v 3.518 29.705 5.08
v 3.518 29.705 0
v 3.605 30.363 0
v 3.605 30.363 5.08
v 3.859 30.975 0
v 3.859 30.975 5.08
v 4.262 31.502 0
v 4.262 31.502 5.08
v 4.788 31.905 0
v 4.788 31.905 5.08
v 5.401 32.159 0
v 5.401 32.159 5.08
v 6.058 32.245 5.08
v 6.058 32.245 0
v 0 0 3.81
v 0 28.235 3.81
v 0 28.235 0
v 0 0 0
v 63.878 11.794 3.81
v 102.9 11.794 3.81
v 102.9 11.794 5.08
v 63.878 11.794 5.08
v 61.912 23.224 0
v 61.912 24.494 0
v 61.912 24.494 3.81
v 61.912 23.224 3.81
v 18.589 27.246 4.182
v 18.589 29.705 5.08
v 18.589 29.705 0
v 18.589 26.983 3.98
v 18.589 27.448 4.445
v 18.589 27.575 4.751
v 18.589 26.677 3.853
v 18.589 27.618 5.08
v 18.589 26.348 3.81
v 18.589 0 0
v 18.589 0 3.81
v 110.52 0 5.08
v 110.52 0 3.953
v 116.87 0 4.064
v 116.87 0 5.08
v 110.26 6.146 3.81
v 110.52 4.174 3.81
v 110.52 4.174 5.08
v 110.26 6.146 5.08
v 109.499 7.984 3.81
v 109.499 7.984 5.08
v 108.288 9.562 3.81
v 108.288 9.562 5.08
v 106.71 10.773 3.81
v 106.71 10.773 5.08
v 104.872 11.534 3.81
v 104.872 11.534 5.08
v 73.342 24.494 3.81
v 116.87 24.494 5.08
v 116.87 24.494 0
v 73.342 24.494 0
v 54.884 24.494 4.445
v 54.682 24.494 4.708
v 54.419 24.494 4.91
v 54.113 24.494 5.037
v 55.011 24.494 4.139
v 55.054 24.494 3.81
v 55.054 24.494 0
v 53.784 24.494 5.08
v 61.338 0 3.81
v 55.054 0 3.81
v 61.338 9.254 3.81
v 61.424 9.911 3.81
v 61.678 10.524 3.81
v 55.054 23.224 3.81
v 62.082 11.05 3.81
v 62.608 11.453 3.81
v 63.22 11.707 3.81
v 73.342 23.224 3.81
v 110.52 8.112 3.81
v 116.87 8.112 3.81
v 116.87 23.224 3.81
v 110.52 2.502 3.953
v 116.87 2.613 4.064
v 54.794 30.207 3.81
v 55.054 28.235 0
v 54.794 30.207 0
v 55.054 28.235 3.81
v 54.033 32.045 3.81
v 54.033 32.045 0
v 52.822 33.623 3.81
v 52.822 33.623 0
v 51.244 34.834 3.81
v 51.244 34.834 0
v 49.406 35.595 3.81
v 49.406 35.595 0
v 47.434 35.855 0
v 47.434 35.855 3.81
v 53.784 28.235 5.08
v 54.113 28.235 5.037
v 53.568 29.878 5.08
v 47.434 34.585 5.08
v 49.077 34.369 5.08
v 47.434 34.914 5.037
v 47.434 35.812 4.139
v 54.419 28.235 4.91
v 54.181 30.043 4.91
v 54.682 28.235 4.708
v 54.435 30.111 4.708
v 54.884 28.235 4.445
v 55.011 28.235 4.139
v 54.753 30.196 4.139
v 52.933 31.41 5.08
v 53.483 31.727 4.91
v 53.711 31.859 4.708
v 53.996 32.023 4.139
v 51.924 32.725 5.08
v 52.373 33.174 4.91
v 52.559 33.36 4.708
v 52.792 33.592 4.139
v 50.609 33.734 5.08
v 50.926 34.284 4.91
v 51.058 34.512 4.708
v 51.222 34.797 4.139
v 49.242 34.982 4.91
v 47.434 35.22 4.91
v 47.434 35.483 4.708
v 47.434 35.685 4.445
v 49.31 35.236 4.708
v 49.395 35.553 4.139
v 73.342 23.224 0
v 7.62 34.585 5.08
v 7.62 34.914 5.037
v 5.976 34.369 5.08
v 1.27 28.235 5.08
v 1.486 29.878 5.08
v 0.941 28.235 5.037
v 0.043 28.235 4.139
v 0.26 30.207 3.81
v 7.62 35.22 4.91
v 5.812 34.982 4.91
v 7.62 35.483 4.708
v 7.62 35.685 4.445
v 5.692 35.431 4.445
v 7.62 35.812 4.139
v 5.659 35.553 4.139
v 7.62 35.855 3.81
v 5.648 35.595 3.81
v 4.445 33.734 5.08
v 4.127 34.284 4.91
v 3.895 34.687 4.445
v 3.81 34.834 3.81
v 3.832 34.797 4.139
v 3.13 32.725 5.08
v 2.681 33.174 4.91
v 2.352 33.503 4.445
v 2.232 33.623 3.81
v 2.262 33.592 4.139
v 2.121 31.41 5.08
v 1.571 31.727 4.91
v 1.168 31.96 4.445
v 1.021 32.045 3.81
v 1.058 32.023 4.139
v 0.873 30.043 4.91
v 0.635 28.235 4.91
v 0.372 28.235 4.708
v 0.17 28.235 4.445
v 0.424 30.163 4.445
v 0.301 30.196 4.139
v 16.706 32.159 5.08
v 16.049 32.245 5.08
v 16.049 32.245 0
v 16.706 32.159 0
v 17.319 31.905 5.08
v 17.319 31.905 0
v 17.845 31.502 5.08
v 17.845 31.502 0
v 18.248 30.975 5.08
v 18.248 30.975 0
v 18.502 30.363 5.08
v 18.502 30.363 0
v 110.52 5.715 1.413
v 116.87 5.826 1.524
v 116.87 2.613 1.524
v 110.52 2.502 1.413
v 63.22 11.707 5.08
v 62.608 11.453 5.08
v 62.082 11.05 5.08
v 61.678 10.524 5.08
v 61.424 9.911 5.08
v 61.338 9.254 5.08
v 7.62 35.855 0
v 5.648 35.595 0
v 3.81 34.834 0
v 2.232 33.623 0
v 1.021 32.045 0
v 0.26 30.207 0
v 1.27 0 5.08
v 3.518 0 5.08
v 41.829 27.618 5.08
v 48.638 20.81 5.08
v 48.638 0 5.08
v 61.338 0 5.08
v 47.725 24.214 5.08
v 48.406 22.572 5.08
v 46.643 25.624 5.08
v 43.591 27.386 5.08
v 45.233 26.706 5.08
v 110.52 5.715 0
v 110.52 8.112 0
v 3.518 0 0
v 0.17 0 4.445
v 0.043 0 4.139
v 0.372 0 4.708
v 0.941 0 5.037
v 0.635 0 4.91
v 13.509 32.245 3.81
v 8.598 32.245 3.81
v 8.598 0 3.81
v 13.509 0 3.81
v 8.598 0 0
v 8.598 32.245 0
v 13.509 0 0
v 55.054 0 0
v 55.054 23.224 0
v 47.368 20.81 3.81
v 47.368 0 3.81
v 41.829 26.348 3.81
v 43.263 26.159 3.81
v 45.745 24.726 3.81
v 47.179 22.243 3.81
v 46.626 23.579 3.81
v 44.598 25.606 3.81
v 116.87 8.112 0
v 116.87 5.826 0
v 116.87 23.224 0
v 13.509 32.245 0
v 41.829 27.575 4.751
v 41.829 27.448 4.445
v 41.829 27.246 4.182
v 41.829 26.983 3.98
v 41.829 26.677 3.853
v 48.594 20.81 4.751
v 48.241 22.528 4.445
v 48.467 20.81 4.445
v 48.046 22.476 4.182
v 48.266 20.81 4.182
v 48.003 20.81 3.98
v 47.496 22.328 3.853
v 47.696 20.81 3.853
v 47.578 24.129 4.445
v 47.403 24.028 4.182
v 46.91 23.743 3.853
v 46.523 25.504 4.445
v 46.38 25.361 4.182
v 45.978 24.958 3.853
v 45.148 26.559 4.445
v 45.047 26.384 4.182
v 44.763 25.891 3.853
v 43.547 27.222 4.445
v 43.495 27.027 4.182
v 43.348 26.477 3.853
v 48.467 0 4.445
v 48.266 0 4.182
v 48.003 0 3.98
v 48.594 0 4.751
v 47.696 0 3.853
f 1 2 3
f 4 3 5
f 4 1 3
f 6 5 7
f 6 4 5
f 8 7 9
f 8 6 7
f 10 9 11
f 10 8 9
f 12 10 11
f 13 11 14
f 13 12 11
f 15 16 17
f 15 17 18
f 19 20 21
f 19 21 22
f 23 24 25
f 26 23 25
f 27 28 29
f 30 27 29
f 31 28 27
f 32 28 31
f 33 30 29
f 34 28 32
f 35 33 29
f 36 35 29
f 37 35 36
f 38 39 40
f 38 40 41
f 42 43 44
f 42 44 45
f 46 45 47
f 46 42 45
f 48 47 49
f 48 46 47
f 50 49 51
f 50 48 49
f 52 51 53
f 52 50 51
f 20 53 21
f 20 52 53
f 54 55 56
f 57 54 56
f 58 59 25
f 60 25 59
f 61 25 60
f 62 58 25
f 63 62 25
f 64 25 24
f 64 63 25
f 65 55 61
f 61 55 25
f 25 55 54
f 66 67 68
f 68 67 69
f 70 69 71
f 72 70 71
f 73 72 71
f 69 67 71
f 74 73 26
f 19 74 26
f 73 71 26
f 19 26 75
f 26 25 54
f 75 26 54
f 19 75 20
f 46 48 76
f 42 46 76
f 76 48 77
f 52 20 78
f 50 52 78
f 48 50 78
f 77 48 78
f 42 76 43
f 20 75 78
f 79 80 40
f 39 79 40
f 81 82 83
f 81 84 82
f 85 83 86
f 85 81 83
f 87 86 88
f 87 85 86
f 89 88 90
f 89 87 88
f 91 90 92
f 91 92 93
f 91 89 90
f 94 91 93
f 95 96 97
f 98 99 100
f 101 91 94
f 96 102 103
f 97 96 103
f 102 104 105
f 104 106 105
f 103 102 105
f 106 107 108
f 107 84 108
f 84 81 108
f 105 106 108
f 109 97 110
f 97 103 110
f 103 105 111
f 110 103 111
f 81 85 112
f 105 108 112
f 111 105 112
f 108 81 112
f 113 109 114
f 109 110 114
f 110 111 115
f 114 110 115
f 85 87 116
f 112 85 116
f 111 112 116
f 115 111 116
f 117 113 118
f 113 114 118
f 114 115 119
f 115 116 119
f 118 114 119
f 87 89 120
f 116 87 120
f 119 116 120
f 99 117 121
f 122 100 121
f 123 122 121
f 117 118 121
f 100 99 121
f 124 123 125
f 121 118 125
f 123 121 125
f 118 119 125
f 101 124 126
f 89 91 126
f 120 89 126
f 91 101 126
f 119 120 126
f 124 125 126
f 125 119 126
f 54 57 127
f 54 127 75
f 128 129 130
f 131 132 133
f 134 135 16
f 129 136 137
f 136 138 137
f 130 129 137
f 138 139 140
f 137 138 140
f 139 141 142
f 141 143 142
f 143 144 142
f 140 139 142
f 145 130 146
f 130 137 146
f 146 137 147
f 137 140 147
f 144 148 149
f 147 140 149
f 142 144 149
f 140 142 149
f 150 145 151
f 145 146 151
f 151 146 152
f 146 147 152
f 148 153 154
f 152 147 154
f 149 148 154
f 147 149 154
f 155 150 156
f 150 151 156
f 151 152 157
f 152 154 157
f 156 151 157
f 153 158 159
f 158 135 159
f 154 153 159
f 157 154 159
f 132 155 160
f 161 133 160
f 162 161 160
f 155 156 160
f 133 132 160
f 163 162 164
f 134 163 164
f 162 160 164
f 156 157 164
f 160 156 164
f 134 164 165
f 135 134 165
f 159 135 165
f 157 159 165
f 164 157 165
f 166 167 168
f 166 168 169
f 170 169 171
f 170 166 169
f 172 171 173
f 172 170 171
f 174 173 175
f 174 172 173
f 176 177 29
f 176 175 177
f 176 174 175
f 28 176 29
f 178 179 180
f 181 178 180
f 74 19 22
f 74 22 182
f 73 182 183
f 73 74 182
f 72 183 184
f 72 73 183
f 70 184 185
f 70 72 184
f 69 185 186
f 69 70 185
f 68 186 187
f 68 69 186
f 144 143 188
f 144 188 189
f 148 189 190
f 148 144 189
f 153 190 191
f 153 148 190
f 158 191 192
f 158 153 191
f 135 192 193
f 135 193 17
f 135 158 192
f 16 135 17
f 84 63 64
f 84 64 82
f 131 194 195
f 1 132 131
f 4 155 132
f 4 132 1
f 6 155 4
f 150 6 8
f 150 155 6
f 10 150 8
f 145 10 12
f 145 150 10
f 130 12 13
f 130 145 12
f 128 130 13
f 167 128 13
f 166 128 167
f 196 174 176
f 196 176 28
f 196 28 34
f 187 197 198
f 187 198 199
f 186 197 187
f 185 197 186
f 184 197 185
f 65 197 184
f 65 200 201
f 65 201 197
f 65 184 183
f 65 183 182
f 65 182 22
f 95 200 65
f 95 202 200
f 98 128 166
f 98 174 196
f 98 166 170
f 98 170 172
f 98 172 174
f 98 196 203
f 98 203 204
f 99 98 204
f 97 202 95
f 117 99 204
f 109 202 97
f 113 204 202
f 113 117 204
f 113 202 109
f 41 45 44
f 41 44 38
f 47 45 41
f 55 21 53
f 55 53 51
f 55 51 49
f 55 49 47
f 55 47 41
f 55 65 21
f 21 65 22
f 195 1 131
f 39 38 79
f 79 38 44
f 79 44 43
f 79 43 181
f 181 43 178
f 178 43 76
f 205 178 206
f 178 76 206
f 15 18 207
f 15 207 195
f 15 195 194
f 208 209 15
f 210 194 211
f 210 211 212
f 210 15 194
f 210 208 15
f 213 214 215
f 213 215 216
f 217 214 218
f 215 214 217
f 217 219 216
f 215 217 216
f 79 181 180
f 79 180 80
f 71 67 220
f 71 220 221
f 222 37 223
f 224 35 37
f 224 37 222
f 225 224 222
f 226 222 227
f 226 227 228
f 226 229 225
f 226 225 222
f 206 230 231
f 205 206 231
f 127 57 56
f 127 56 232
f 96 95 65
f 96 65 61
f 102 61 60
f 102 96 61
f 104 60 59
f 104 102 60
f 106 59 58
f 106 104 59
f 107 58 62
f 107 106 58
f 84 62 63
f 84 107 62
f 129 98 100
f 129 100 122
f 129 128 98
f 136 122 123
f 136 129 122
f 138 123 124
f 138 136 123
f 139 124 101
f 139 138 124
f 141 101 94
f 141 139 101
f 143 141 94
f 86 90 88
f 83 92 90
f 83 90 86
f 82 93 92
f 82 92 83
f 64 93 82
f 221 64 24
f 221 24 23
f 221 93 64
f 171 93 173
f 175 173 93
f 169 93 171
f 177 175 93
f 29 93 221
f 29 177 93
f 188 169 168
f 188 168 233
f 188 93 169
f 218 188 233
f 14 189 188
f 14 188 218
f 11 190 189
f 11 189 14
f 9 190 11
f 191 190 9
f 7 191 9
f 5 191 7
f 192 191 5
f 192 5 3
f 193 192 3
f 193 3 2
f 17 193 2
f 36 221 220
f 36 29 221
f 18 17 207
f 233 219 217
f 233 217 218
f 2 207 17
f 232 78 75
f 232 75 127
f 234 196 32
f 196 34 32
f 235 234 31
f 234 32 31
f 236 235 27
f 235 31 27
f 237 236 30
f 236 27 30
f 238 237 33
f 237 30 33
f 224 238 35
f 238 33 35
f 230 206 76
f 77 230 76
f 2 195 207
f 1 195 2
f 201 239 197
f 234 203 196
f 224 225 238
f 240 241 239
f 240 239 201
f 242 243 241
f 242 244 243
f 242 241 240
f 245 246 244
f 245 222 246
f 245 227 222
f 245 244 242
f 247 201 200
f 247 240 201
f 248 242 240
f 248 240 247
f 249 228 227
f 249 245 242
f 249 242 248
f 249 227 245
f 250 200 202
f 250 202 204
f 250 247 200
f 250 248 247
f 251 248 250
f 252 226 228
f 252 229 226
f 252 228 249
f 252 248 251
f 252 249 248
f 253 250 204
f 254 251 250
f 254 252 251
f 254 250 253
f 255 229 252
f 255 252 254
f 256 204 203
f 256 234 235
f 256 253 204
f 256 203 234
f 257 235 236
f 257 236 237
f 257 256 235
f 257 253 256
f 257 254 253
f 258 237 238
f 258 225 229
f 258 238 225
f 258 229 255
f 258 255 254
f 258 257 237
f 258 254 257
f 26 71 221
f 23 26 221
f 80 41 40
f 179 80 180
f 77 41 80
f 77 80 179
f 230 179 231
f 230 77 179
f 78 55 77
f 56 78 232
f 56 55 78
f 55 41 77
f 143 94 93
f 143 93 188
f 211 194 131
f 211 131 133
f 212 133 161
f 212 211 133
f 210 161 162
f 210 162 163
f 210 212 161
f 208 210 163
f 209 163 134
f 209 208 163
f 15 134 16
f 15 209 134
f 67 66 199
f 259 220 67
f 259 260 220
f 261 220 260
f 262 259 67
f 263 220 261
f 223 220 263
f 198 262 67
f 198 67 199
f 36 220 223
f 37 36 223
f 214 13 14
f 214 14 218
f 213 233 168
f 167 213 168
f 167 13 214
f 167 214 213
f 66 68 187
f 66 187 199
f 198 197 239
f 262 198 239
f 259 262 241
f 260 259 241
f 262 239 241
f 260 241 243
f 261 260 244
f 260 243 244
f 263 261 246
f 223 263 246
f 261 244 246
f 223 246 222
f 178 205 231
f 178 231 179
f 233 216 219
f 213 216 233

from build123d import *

# Parameters (mm, degrees)
EXTRUDE1_DEPTH           = 5.08
EXTRUDE2_DEPTH           = 1.27
EXTRUDE3_DEPTH           = 3.81
SKETCH1_5_W              = 4.91012523
SKETCH1_5_H              = 32.245498845
EXTRUDE4_DEPTH           = 3.81
FILLET2_R                = 1.27
FILLET3_R                = 1.27
SKETCH3_W                = 7.62
SKETCH3_H                = 71.709798158
CUT_EXTRUDE1_DEPTH       = 69.436
EXTRUDE_THIN4_DEPTH      = 61.816
EXTRUDE_THIN4_DEPTH_BACK = 5.08
SKETCH3_4_W              = 10.16
SKETCH3_4_H              = 48.987051728
SKETCH3_4_W_2            = 7.62
SKETCH3_4_H_2            = 46.447051728
CUT_EXTRUDE2_DEPTH       = 132.052100446
CUT_EXTRUDE2_DEPTH_BACK  = 132.052100446
SKETCH4_W                = 11.43
SKETCH4_H                = 7.62
CUT_EXTRUDE3_DEPTH       = 123.667785998
EXTRUDE7_START           = -6.35
EXTRUDE7_DEPTH           = 6.35
CUT_EXTRUDE4_DEPTH       = 6.35
CUT_EXTRUDE4_DRAFT       = -1
CUT_EXTRUDE5_DEPTH       = 123.351814538
CUT_EXTRUDE5_DEPTH_BACK  = 123.351814538


# Read off the part's stored shape, not the designer's step: Extrude7
with BuildPart() as part:
    # Sketch1 → Extrude1 (new, symmetric)
    with BuildSketch(Plane.XY):
        with BuildLine():
            Line((55.053954756, 23.223525864), (55.053954756, 28.234899079))
            ThreePointArc((55.053954756, 28.234899079), (52.822108428, 33.623052752), (47.433954756, 35.854899079))
            Line((47.433954756, 35.854899079), (7.62, 35.854899079))
            ThreePointArc((7.62, 35.854899079), (2.231846327, 33.623052752), (0, 28.234899079))
            Line((0, 28.234899079), (0, -28.234899079))
            ThreePointArc((0, -28.234899079), (2.231846327, -33.623052752), (7.62, -35.854899079))
            Line((7.62, -35.854899079), (47.433954756, -35.854899079))
            ThreePointArc((47.433954756, -35.854899079), (52.822108428, -33.623052752), (55.053954756, -28.234899079))
            Line((55.053954756, -28.234899079), (55.053954756, -23.223525864))
            Line((55.053954756, -23.223525864), (55.053954756, -19.324782682))
            Line((55.053954756, -19.324782682), (55.053954756, -16.240810389))
            Line((55.053954756, -16.240810389), (55.053954756, -5.571934871))
            Line((55.053954756, -5.571934871), (55.053954756, -2.359181621))
            Line((55.053954756, -2.359181621), (55.053954756, 2.359181621))
            Line((55.053954756, 2.359181621), (55.053954756, 5.571934871))
            Line((55.053954756, 5.571934871), (55.053954756, 16.240810389))
            Line((55.053954756, 16.240810389), (55.053954756, 19.324782682))
            Line((55.053954756, 19.324782682), (55.053954756, 23.223525864))
        make_face()
        with BuildLine():
            ThreePointArc((16.048576777, 32.245498845), (17.844628001, 31.501550069), (18.588576777, 29.705498845))
            Line((18.588576777, 29.705498845), (18.588576777, 27.618036038))
            Line((18.588576777, 27.618036038), (41.829183295, 27.618036038))
            ThreePointArc((41.829183295, 27.618036038), (46.643426698, 25.623911128), (48.637551607, 20.809667725))
            Line((48.637551607, 20.809667725), (48.637551607, -20.809667725))
            ThreePointArc((48.637551607, -20.809667725), (46.643426698, -25.623911128), (41.829183295, -27.618036038))
            Line((41.829183295, -27.618036038), (18.588576777, -27.618036038))
            Line((18.588576777, -27.618036038), (18.588576777, -29.705498845))
            ThreePointArc((18.588576777, -29.705498845), (17.844628001, -31.501550069), (16.048576777, -32.245498845))
            Line((16.048576777, -32.245498845), (13.508576777, -32.245498845))
            Line((13.508576777, -32.245498845), (8.598451547, -32.245498845))
            Line((8.598451547, -32.245498845), (6.058451547, -32.245498845))
            ThreePointArc((6.058451547, -32.245498845), (4.262400322, -31.501550069), (3.518451547, -29.705498845))
            Line((3.518451547, -29.705498845), (3.518451547, 29.705498845))
            ThreePointArc((3.518451547, 29.705498845), (4.262400322, 31.501550069), (6.058451547, 32.245498845))
            Line((6.058451547, 32.245498845), (8.598451547, 32.245498845))
            Line((8.598451547, 32.245498845), (13.508576777, 32.245498845))
            Line((13.508576777, 32.245498845), (16.048576777, 32.245498845))
        make_face(mode=Mode.SUBTRACT)
    extrude(amount=EXTRUDE1_DEPTH, both=True)

    # Sketch1<3> → Extrude2 (add, symmetric)
    with BuildSketch(Plane.XY):
        Polygon((110.911701022, 19.324782682), (55.053954756, 19.324782682), (55.053954756, 16.240810389), (107.354901489, 16.240810389), align=None)
        Polygon((114.44157437, -2.359181621), (55.053954756, -2.359181621), (55.053954756, -5.571934871), (107.985089149, -5.571934871), align=None)
        Polygon((107.985089149, 5.571934871), (55.053954756, 5.571934871), (55.053954756, 2.359181621), (114.44157437, 2.359181621), align=None)
        Polygon((107.354901489, -16.240810389), (55.053954756, -16.240810389), (55.053954756, -19.324782682), (110.911701022, -19.324782682), align=None)
    extrude(amount=EXTRUDE2_DEPTH, both=True)

    # Sketch1<4> → Extrude3 (add, symmetric)
    with BuildSketch(Plane.XY):
        with BuildLine():
            Line((99.162437765, 23.223525864), (55.053954756, 23.223525864))
            Line((55.053954756, 23.223525864), (55.053954756, 19.324782682))
            Line((55.053954756, 19.324782682), (110.911701022, 19.324782682))
            ThreePointArc((110.911701022, 19.324782682), (111.567818322, 19.699285472), (111.579007121, 20.454677463))
            Line((111.579007121, 20.454677463), (109.51169598, 24.204470623))
            ThreePointArc((109.51169598, 24.204470623), (105.172136608, 28.674517094), (99.162437765, 30.316653142))
            Line((99.162437765, 30.316653142), (99.162437765, 23.223525864))
        make_face()
        Polygon((114.44157437, 2.359181621), (55.053954756, 2.359181621), (55.053954756, -2.359181621), (114.44157437, -2.359181621), (117.074513308, -1.049028675), (117.074513308, 1.049028675), align=None)
        with BuildLine():
            Line((55.053954756, -19.324782682), (55.053954756, -23.223525864))
            Line((55.053954756, -23.223525864), (99.162437765, -23.223525864))
            Line((99.162437765, -23.223525864), (99.162437765, -30.316653142))
            ThreePointArc((99.162437765, -30.316653142), (105.172136608, -28.674517094), (109.51169598, -24.204470623))
            Line((109.51169598, -24.204470623), (111.579007121, -20.454677463))
            ThreePointArc((111.579007121, -20.454677463), (111.567818322, -19.699285472), (110.911701022, -19.324782682))
            Line((110.911701022, -19.324782682), (55.053954756, -19.324782682))
        make_face()
    extrude(amount=EXTRUDE3_DEPTH, both=True)

    # Sketch1<5> → Extrude4 (add, symmetric)
    with BuildSketch(Plane.XY):
        with BuildLine():
            Line((48.637551607, 0), (18.588576777, 0))
            Line((18.588576777, 0), (18.588576777, -27.618036038))
            Line((18.588576777, -27.618036038), (41.829183295, -27.618036038))
            ThreePointArc((41.829183295, -27.618036038), (46.643426698, -25.623911128), (48.637551607, -20.809667725))
            Line((48.637551607, -20.809667725), (48.637551607, 0))
        make_face()
        with BuildLine():
            Line((18.588576777, 27.618036038), (18.588576777, 0))
            Line((18.588576777, 0), (48.637551607, 0))
            Line((48.637551607, 0), (48.637551607, 20.809667725))
            ThreePointArc((48.637551607, 20.809667725), (46.643426698, 25.623911128), (41.829183295, 27.618036038))
            Line((41.829183295, 27.618036038), (18.588576777, 27.618036038))
        make_face()
        with Locations((11.053514162, -16.122749423)):
            Rectangle(SKETCH1_5_W, SKETCH1_5_H)
        with Locations((11.053514162, 16.122749423)):
            Rectangle(SKETCH1_5_W, SKETCH1_5_H)
    extrude(amount=EXTRUDE4_DEPTH, both=True)

    # Fillet2
    fillet2_edges = [part.edges().sort_by_distance(p)[0] for p in [
        (30.208880036, -27.618036038, -3.81),
        (30.208880036, -27.618036038, 3.81),
        (46.643426698, -25.623911128, -3.81),
        (46.643426698, -25.623911128, 3.81),
        (48.637551607, 0, -3.81),
        (48.637551607, 0, 3.81),
        (46.643426698, 25.623911128, -3.81),
        (46.643426698, 25.623911128, 3.81),
        (30.208880036, 27.618036038, -3.81),
        (30.208880036, 27.618036038, 3.81),
    ]]
    fillet(fillet2_edges, radius=FILLET2_R - 0.0001)  # a hair under: the kernel refuses the full size

    # Fillet3
    fillet3_edges = [part.edges().sort_by_distance(p)[0] for p in [
        (2.231846327, 33.623052752, -5.08),
        (27.526977378, 35.854899079, -5.08),
        (52.822108428, 33.623052752, -5.08),
        (55.053954756, 0, -5.08),
        (52.822108428, -33.623052752, -5.08),
        (27.526977378, -35.854899079, -5.08),
        (2.231846327, -33.623052752, -5.08),
        (0, 0, -5.08),
        (0, 0, 5.08),
        (2.231846327, -33.623052752, 5.08),
        (27.526977378, -35.854899079, 5.08),
        (52.822108428, -33.623052752, 5.08),
        (55.053954756, 0, 5.08),
        (52.822108428, 33.623052752, 5.08),
        (27.526977378, 35.854899079, 5.08),
        (2.231846327, 33.623052752, 5.08),
    ]]
    fillet(fillet3_edges, radius=FILLET3_R - 0.0001)  # a hair under: the kernel refuses the full size

    # Sketch3 → Cut-Extrude1 (cut)
    with BuildSketch(Plane(origin=(55.053954756, 0, 0), x_dir=(0, 0, -1), z_dir=(1, 0, 0))):
        Rectangle(SKETCH3_W, SKETCH3_H)
    extrude(amount=CUT_EXTRUDE1_DEPTH, mode=Mode.SUBTRACT)

    # Sketch3<4> → Extrude-Thin4 (add, two sides: drawn at the far end of the back side and taken through both)
    with BuildSketch(Plane(origin=(55.053954756, 0, 0), x_dir=(0, 0, -1), z_dir=(1, 0, 0)).offset(-EXTRUDE_THIN4_DEPTH_BACK)):
        Rectangle(SKETCH3_4_W, SKETCH3_4_H)
        Rectangle(SKETCH3_4_W_2, SKETCH3_4_H_2, mode=Mode.SUBTRACT)
    extrude(amount=EXTRUDE_THIN4_DEPTH + EXTRUDE_THIN4_DEPTH_BACK)

    # Sketch4 → Cut-Extrude2 (cut, two sides: drawn at the far end of the back side and taken through both)
    with BuildSketch(Plane.XZ.offset(-23.223525864).offset(-CUT_EXTRUDE2_DEPTH_BACK)):
        with Locations((67.626954756, 0)):
            Rectangle(SKETCH4_W, SKETCH4_H)
    extrude(amount=CUT_EXTRUDE2_DEPTH + CUT_EXTRUDE2_DEPTH_BACK, mode=Mode.SUBTRACT)

    # Sketch5 → Cut-Extrude3 (cut, through all)
    with BuildSketch(Plane(origin=(0, 0, -5.08), x_dir=(-1, 0, 0), z_dir=(0, 0, -1))):
        with BuildLine():
            Line((-102.899954756, 11.793525864), (-63.877551607, 11.793525864))
            ThreePointArc((-63.877551607, 11.793525864), (-62.081500383, 11.049577089), (-61.337551607, 9.253525864))
            Line((-61.337551607, 9.253525864), (-61.337551607, -4.173525864))
            ThreePointArc((-61.337551607, -4.173525864), (-63.569397935, -9.561679537), (-68.957551607, -11.793525864))
            Line((-68.957551607, -11.793525864), (-107.979954756, -11.793525864))
            ThreePointArc((-107.979954756, -11.793525864), (-109.77600598, -11.049577089), (-110.519954756, -9.253525864))
            Line((-110.519954756, -9.253525864), (-110.519954756, 4.173525864))
            ThreePointArc((-110.519954756, 4.173525864), (-108.288108428, 9.561679537), (-102.899954756, 11.793525864))
        make_face()
    extrude(amount=-CUT_EXTRUDE3_DEPTH, mode=Mode.SUBTRACT)

    # Extrude7 outline → Extrude7 (add)
    with BuildSketch(Plane(origin=(116.869954756, 0, 0), x_dir=(0, 0, -1), z_dir=(1, 0, 0)).offset(EXTRUDE7_START)):
        Polygon((-1.27, 5.571934871), (1.27, 5.571934871), (1.27, 2.359181621), (3.81, 2.359181621), (3.81, 8.111934871), (-3.81, 8.111934871), (-3.81, 2.359181621), (-1.27, 2.359181621), align=None)
        Polygon((3.81, -8.111934871), (3.81, -2.359181621), (1.27, -2.359181621), (1.27, -5.571934871), (-1.27, -5.571934871), (-1.27, -2.359181621), (-3.81, -2.359181621), (-3.81, -8.111934871), align=None)
    extrude(amount=EXTRUDE7_DEPTH)


with BuildPart() as cut_extrude4_tool:
    # Sketch7 → Cut-Extrude4 (with draft: the straight prism first)
    with BuildSketch(Plane(origin=(116.869954756, 0, 0), x_dir=(0, 0, -1), z_dir=(1, 0, 0))):
        Polygon((-1.524, 2.613181621), (-4.064, 2.613181621), (-4.064, -2.613181621), (-1.524, -2.613181621), (-1.524, -5.825934871), (1.524, -5.825934871), (1.524, -2.613181621), (4.064, -2.613181621), (4.064, 2.613181621), (1.524, 2.613181621), (1.524, 5.825934871), (-1.524, 5.825934871), align=None)
    extrude(amount=-CUT_EXTRUDE4_DEPTH)
    # Cut-Extrude4: the draft: its side faces are tilted about the plane it starts from
    cut_extrude4_sides = [cut_extrude4_tool.faces().sort_by_distance(p)[0] for p in [
        (113.694954756, 2.613181621, 2.794),
        (113.694954756, 0, 4.064),
        (113.694954756, -2.613181621, 2.794),
        (113.694954756, -4.219558246, 1.524),
        (113.694954756, -5.825934871, 0),
        (113.694954756, -4.219558246, -1.524),
        (113.694954756, -2.613181621, -2.794),
        (113.694954756, 0, -4.064),
        (113.694954756, 2.613181621, -2.794),
        (113.694954756, 4.219558246, -1.524),
        (113.694954756, 5.825934871, 0),
        (113.694954756, 4.219558246, 1.524),
    ]]
    draft(cut_extrude4_sides, Plane(origin=(116.869954756, 0, 0), x_dir=(0, 0, -1), z_dir=(1, 0, 0)), CUT_EXTRUDE4_DRAFT)


with BuildPart() as part_1:
    add(part.part)

    # Cut-Extrude4: cut by cut_extrude4_tool
    add(cut_extrude4_tool.part, mode=Mode.SUBTRACT)

    # Sketch8 → Cut-Extrude5 (cut, two sides: drawn at the far end of the back side and taken through both)
    with BuildSketch(Plane(origin=(116.869954756, 0, 0), x_dir=(0, 0, -1), z_dir=(1, 0, 0)).offset(-CUT_EXTRUDE5_DEPTH_BACK)):
        Polygon((-158.859018875, 0), (-5.08, 0), (0, 0), (0, 35.854899079), (0, 189.633917954), (235.763888228, -7.868830363), (76.904869352, -197.502748317), align=None)
    extrude(amount=CUT_EXTRUDE5_DEPTH + CUT_EXTRUDE5_DEPTH_BACK, mode=Mode.SUBTRACT)


solid = part_1.part
